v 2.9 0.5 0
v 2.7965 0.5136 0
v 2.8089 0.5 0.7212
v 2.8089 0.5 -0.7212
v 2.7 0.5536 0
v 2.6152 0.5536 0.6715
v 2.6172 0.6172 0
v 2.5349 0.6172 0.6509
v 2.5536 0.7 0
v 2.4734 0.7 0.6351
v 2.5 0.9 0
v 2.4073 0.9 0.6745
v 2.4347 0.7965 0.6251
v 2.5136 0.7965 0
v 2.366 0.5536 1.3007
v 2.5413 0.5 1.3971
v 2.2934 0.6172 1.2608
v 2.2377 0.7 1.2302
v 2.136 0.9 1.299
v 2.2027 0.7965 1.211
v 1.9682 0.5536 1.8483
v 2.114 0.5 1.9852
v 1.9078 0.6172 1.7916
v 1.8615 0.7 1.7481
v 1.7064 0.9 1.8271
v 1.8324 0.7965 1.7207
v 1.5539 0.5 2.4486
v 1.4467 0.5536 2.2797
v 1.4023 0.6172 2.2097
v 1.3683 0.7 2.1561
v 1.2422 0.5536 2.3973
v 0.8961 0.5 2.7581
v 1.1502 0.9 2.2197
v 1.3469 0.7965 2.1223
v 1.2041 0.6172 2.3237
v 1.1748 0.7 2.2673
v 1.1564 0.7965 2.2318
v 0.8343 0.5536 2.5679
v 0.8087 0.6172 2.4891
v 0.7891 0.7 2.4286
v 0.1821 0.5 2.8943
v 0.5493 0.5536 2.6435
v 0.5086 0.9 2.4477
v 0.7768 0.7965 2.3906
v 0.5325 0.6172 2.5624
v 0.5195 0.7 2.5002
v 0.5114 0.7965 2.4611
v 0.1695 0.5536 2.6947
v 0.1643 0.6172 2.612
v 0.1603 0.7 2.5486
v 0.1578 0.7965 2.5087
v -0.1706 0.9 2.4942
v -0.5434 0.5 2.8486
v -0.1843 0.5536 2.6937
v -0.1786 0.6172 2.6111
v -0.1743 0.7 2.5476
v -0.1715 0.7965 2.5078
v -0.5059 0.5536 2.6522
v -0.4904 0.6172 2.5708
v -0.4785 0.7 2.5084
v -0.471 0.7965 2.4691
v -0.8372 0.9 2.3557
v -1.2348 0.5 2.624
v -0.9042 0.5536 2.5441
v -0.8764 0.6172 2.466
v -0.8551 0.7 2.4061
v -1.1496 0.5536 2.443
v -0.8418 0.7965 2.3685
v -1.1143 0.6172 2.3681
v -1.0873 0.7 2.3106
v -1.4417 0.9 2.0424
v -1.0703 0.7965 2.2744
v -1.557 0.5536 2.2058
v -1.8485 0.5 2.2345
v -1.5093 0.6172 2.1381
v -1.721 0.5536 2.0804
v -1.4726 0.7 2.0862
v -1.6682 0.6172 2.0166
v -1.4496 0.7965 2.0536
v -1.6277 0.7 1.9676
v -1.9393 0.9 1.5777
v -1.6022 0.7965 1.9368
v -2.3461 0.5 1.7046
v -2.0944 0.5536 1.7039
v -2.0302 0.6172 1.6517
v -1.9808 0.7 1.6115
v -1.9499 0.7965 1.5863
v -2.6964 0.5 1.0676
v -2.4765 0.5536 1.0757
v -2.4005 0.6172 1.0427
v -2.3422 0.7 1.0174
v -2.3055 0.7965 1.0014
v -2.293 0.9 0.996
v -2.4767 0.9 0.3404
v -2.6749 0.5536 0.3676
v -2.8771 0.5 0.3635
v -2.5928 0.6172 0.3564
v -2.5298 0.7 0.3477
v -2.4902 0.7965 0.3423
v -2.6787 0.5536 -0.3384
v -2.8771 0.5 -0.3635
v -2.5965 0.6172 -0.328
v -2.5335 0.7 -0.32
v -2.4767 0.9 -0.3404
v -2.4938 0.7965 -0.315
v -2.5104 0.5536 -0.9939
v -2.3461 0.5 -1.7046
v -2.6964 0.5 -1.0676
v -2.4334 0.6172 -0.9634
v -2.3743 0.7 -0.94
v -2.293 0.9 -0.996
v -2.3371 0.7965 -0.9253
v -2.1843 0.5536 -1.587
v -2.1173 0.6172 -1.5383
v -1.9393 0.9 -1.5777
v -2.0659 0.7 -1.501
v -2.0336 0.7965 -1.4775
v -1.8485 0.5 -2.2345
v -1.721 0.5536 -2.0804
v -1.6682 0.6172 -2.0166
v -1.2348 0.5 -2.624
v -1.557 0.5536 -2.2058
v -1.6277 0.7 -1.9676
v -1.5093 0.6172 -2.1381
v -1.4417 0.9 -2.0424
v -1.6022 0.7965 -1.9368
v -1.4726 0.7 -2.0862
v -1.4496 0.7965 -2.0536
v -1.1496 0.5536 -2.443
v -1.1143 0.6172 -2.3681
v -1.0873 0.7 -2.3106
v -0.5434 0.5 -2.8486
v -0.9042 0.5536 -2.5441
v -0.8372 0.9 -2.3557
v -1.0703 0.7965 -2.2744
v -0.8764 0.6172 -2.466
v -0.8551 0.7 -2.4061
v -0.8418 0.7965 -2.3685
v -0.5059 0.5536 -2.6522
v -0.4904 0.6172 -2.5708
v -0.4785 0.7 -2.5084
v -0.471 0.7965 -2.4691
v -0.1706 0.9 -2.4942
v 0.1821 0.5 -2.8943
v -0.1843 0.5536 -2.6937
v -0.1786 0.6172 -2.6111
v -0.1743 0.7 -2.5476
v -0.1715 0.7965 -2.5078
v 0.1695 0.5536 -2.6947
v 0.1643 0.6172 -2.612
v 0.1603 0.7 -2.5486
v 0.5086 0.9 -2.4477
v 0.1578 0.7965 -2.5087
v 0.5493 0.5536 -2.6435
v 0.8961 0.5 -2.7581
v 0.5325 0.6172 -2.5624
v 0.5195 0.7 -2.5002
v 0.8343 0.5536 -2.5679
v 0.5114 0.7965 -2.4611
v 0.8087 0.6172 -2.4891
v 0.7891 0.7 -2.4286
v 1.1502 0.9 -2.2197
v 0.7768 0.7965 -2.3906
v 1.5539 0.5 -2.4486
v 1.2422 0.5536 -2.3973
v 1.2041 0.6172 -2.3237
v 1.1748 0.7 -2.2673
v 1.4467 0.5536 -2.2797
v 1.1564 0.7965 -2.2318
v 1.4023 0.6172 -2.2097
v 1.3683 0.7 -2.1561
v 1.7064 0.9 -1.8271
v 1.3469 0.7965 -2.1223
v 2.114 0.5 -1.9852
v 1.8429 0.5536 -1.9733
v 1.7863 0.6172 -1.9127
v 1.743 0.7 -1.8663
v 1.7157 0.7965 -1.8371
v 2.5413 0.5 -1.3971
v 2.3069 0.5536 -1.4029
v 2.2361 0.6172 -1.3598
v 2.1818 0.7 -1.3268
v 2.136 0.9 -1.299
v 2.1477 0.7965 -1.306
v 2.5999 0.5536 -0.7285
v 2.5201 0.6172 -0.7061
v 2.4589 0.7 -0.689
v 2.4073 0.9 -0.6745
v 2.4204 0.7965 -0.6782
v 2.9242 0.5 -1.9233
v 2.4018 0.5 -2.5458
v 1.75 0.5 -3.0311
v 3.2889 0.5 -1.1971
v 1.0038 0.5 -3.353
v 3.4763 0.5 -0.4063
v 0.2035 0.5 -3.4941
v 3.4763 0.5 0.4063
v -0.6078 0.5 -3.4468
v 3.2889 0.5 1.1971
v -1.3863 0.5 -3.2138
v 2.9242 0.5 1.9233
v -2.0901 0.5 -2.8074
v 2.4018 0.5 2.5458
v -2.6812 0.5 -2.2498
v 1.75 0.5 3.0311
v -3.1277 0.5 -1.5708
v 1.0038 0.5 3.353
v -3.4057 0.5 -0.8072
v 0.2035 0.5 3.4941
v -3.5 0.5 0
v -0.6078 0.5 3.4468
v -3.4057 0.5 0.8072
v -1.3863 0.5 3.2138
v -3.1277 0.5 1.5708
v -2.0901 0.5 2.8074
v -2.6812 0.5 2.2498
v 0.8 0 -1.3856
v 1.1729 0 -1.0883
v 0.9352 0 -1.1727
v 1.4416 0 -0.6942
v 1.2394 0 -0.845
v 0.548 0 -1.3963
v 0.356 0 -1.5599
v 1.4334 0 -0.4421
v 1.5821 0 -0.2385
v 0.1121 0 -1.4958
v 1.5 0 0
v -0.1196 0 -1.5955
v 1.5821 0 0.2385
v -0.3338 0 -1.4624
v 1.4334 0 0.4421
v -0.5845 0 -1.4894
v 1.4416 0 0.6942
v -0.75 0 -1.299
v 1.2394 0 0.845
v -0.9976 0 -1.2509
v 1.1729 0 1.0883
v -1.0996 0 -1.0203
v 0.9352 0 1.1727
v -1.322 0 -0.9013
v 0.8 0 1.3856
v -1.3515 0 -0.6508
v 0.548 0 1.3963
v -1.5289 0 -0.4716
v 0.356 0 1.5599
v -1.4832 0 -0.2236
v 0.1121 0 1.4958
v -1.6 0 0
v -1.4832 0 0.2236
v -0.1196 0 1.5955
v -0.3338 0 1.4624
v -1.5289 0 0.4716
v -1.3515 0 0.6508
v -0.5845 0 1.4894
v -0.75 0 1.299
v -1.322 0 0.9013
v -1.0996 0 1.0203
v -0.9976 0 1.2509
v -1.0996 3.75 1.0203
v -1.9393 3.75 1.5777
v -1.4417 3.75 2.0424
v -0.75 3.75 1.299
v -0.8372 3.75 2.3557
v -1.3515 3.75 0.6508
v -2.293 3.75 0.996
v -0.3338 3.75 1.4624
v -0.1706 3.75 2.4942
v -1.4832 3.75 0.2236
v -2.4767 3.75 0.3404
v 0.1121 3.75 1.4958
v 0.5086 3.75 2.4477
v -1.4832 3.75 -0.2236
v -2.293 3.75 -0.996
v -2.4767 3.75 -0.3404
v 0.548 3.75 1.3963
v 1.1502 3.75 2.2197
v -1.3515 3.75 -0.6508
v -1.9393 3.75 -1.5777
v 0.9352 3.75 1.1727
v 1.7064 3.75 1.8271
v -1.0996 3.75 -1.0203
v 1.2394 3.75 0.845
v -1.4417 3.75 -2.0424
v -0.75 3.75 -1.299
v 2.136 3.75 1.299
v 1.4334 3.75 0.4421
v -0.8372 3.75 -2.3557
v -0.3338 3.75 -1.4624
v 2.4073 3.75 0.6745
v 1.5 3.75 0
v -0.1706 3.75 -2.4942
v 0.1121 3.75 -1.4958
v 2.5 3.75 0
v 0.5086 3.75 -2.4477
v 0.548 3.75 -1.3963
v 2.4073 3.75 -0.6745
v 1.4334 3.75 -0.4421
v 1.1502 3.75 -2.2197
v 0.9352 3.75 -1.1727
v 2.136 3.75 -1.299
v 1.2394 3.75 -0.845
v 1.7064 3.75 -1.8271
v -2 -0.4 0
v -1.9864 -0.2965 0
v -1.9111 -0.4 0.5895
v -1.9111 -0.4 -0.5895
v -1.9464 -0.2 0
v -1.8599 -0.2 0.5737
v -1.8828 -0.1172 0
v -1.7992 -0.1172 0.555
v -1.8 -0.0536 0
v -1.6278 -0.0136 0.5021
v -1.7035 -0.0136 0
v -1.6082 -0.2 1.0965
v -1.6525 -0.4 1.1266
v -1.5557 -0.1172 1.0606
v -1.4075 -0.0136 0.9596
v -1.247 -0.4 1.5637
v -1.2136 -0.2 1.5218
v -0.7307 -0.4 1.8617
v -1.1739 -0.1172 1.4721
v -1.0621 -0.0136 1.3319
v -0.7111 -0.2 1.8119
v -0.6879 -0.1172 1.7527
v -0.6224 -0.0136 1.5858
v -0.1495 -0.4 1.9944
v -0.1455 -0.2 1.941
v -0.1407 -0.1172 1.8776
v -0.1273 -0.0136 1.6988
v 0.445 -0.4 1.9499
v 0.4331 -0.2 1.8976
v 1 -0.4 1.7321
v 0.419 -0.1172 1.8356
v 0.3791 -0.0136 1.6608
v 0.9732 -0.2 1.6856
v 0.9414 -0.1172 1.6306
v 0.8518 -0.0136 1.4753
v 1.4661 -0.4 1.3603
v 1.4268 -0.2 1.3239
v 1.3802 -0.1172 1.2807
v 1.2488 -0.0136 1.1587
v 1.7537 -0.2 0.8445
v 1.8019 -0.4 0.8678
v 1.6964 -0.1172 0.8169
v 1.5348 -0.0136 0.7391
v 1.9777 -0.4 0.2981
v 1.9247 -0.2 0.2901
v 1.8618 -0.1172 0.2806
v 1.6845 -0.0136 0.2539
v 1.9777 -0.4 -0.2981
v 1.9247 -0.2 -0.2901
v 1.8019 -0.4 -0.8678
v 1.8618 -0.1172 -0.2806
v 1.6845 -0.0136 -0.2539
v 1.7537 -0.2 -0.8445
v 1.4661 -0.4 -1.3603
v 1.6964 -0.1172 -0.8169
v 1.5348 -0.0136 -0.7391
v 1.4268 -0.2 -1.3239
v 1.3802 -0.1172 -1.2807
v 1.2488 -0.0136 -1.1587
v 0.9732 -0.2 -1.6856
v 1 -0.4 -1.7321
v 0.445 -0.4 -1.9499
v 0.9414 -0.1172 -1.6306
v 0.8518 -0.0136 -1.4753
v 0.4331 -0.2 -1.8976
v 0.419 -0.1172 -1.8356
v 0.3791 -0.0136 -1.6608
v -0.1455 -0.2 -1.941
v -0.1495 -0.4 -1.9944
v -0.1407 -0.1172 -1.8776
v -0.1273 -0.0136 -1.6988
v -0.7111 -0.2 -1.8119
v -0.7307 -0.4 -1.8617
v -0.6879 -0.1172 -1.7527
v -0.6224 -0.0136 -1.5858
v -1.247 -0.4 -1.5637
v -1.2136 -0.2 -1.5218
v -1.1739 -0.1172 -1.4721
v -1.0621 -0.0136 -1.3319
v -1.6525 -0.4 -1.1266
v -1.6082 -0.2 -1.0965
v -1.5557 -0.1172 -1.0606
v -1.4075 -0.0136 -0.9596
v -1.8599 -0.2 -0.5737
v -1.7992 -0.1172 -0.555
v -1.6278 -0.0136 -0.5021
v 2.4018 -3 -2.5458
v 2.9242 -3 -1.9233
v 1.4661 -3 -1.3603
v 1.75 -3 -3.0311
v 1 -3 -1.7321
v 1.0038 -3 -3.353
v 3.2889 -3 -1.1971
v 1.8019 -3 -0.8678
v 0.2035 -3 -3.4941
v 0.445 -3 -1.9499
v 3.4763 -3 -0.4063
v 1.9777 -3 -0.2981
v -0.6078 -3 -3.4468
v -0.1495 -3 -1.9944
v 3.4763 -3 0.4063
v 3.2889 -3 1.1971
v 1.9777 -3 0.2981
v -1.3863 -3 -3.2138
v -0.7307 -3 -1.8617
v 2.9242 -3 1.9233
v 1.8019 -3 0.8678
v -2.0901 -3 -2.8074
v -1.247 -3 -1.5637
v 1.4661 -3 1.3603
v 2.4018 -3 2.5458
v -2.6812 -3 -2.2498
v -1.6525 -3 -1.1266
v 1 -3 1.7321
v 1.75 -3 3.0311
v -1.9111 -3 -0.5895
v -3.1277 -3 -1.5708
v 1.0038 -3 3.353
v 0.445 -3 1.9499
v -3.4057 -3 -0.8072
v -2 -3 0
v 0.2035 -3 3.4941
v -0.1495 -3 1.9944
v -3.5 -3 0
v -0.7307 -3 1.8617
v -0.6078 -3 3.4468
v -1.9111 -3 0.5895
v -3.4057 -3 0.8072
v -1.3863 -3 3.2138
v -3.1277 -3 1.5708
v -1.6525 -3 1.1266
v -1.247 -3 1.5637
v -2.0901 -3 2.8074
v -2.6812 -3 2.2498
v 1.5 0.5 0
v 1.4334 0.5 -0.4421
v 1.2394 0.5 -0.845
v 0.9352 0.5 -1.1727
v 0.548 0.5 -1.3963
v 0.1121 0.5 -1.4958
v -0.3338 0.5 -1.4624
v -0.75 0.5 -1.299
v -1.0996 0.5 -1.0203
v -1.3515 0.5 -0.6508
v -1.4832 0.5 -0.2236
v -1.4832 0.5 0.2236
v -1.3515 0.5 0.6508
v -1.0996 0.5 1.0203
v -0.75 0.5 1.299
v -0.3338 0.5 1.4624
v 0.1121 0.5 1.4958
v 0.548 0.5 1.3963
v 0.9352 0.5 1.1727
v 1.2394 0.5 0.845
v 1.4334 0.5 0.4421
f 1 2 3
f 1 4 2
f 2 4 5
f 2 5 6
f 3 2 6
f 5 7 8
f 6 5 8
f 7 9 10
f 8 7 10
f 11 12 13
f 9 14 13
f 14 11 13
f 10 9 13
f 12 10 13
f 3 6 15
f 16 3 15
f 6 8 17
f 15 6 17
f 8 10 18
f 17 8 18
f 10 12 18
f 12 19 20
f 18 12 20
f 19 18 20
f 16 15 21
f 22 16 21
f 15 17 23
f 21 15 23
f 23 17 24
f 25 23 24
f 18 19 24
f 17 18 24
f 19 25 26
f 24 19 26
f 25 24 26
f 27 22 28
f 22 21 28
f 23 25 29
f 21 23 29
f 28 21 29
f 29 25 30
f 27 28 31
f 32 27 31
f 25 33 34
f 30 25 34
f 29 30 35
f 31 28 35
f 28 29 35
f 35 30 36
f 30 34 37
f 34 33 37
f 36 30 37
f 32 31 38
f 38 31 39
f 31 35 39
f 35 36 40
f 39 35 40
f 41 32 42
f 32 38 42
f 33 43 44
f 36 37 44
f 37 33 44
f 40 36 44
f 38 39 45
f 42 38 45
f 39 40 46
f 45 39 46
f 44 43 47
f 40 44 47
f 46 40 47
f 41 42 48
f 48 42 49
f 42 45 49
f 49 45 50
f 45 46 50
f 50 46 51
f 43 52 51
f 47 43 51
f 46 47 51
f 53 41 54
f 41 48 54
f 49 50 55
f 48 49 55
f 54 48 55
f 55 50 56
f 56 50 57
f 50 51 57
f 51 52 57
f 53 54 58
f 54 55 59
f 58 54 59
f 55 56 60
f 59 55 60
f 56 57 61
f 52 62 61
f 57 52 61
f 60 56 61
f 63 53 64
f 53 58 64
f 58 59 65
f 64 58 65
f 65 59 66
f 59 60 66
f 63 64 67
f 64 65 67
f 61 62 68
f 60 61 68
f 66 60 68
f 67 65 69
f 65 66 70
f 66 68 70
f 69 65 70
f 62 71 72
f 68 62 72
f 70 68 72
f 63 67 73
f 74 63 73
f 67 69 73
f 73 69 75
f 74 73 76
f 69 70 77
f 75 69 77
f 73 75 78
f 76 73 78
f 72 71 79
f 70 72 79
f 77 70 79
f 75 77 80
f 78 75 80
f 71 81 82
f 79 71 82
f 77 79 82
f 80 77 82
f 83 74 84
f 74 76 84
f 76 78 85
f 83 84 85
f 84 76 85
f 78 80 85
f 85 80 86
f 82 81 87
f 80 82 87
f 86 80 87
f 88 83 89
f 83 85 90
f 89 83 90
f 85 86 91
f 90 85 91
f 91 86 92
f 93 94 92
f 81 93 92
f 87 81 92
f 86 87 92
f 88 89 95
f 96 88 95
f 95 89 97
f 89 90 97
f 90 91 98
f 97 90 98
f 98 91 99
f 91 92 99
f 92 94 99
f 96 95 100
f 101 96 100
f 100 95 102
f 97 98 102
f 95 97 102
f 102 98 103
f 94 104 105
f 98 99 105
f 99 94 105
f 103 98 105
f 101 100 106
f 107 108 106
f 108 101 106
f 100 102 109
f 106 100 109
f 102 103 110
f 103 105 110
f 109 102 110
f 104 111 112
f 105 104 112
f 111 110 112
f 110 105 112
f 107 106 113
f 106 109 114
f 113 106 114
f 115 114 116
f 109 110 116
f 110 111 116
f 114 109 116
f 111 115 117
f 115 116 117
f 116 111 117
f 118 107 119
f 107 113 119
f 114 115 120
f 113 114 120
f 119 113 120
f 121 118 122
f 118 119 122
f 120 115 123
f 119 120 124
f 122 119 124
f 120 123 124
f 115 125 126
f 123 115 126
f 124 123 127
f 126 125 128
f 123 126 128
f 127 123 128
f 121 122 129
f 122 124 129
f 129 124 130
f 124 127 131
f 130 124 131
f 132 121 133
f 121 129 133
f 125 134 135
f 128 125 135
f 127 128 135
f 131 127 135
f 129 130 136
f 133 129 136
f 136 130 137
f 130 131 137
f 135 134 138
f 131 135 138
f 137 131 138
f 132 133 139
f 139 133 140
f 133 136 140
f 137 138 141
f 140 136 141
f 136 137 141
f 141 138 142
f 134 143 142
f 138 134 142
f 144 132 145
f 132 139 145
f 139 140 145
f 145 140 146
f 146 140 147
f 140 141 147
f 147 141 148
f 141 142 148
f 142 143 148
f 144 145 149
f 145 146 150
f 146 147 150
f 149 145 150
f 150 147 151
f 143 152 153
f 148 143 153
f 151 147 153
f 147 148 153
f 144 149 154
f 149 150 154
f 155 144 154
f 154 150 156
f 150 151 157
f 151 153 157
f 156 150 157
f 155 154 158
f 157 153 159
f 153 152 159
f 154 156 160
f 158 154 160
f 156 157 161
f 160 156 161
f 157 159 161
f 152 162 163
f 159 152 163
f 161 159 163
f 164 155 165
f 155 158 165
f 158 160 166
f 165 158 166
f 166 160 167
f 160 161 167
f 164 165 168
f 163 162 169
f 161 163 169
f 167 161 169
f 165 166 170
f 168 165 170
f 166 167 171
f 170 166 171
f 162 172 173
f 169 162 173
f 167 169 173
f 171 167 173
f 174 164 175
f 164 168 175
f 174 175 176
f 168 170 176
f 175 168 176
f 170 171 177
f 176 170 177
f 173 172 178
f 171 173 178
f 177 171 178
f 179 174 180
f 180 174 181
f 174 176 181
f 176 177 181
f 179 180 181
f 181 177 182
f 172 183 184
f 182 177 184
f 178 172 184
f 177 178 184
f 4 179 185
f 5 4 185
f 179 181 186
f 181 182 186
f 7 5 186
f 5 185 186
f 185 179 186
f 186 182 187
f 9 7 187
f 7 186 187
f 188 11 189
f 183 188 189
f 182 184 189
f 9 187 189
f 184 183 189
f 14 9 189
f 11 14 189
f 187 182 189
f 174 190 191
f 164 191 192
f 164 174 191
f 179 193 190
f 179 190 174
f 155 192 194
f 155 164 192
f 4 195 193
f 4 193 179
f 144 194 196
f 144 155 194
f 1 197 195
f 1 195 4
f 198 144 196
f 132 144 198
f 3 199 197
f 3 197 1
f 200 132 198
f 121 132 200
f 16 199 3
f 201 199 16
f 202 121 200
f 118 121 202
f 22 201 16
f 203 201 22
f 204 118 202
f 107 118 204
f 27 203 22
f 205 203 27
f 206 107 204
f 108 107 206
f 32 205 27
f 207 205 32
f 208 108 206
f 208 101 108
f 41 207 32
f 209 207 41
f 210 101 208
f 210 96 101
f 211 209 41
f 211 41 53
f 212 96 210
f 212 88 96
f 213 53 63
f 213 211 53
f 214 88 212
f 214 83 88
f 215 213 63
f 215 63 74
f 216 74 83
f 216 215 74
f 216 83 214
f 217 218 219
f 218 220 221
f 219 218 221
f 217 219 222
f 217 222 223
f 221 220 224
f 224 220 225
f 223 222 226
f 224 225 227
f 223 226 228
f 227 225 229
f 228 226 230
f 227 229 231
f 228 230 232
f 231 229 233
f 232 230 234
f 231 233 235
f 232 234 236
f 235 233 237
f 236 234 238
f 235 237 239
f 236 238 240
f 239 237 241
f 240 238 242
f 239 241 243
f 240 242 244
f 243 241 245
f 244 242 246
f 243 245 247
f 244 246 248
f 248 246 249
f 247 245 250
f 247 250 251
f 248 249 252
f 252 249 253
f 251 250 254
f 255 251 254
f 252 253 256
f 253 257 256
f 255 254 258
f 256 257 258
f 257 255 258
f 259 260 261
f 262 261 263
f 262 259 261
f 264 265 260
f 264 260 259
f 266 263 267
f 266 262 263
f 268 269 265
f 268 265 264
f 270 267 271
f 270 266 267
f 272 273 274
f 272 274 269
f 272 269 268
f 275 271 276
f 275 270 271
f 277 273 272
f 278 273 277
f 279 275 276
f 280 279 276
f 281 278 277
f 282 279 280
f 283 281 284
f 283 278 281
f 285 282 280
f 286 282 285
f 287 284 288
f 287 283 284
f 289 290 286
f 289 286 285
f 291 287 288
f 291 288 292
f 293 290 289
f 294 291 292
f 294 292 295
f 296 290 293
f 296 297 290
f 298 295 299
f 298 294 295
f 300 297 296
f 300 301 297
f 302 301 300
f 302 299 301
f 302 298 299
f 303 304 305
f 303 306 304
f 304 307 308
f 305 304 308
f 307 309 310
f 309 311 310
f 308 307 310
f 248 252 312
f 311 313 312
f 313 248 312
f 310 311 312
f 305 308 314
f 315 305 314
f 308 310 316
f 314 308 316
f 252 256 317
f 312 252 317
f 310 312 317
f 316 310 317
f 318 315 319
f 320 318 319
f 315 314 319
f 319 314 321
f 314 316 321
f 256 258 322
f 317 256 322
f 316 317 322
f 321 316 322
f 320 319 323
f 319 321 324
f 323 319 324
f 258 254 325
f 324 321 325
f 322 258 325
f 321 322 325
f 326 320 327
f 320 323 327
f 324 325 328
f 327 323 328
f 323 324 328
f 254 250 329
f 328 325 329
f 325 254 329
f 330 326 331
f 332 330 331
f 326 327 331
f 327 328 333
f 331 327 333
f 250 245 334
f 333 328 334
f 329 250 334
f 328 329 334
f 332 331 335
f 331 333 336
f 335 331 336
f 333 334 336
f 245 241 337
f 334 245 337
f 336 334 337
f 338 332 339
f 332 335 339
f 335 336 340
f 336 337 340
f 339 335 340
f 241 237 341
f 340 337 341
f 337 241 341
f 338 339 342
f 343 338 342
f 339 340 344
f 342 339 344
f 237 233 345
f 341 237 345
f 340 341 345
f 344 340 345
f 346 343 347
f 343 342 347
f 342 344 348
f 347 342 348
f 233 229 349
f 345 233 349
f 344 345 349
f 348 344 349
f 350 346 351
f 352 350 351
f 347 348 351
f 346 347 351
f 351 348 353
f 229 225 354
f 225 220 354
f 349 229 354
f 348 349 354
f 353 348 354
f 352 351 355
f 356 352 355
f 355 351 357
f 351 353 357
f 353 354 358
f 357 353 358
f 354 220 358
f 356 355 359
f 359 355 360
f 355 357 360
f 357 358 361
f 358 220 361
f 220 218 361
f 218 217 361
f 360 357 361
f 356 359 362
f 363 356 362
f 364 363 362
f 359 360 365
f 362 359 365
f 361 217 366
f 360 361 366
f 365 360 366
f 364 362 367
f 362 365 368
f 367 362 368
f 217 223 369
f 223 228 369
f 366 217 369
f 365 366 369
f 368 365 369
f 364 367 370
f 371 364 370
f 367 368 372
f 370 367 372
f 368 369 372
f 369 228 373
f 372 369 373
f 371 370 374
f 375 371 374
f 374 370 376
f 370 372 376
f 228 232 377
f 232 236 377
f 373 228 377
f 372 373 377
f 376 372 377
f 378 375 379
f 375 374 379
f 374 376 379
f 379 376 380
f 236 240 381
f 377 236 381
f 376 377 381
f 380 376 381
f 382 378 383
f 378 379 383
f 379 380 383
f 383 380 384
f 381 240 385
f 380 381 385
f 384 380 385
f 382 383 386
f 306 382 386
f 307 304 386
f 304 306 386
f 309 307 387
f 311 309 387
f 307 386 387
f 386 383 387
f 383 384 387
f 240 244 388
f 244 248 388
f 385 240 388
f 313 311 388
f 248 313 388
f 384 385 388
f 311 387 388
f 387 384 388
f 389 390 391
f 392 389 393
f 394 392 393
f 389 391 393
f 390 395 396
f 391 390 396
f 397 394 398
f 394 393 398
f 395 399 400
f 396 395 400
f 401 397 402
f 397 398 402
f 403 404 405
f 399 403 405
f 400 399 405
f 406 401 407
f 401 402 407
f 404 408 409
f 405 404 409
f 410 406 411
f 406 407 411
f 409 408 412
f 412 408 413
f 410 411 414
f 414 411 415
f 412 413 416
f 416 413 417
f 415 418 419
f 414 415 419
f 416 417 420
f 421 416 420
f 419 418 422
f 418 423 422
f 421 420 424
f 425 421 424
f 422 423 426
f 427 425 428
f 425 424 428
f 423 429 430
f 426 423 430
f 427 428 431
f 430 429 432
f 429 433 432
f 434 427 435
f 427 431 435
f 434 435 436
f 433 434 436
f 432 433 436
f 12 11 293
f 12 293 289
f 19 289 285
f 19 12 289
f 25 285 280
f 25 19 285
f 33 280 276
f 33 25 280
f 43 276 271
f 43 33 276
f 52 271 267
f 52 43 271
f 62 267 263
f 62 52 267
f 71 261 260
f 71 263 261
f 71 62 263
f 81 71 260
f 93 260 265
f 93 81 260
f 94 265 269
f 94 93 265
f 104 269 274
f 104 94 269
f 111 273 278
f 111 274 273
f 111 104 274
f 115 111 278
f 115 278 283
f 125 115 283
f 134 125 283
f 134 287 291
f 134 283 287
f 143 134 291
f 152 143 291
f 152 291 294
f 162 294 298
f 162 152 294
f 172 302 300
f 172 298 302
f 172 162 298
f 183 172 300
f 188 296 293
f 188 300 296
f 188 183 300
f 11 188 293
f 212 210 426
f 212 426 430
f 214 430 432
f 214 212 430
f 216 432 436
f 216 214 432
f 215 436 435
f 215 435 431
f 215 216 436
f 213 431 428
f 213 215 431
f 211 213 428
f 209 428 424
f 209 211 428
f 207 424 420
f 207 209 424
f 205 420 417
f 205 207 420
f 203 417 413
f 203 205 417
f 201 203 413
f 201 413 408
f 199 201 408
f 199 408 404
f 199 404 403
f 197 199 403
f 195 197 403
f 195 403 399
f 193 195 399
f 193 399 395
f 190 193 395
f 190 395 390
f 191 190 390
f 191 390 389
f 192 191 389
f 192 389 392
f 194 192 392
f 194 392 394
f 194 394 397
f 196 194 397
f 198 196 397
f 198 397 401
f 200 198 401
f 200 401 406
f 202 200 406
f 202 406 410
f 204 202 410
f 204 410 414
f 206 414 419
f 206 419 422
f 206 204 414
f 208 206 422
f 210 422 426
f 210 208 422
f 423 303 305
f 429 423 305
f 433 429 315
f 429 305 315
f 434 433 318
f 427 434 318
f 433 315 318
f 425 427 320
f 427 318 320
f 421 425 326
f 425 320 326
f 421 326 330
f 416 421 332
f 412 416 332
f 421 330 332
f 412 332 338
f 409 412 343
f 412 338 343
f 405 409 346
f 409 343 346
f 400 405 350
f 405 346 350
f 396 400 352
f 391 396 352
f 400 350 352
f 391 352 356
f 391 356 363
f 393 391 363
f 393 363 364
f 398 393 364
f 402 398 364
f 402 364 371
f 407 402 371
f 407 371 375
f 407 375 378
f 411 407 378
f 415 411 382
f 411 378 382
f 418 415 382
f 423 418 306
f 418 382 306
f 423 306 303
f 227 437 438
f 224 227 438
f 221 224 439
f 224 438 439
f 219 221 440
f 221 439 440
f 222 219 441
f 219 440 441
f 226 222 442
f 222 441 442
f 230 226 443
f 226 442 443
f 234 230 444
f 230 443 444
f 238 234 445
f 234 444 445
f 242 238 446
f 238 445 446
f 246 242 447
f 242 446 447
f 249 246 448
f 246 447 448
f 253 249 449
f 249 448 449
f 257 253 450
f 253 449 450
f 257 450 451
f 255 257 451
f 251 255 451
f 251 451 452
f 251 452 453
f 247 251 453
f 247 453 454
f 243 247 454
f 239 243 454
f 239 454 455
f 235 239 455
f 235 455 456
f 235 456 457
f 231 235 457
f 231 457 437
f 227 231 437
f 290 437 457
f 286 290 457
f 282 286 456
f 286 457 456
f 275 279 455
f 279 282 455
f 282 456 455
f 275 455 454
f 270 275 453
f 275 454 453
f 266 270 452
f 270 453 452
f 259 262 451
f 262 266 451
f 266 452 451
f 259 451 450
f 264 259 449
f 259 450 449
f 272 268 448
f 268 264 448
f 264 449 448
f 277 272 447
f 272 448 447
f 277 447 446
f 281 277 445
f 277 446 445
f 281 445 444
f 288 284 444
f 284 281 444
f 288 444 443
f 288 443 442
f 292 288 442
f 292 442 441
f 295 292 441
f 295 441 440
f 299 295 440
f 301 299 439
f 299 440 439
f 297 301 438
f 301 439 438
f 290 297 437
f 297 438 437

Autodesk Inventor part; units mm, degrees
ref_plane "YZ Plane" through (0, 0, 0) normal (1, 0, 0) x (0, 1, 0)
ref_plane "XZ Plane" through (0, 0, 0) normal (0, 1, 0) x (-1, 0, 0)
ref_plane "XY Plane" through (0, 0, 0) normal (0, 0, 1) x (1, 0, 0)
sketch "Sketch1" plane through (0, 0, 0) normal (0, 1, 0) x (-1, 0, 0)
  circle A0 centre (0, 0) radius 3.5
  circle A1 centre (0, 0) radius 2
  dimension "d0" = 7
  dimension "d2" = 4
extrude "Extrusion1" add sketch "Sketch1" against normal blind 3
extrude "Extrusion2" add sketch "Sketch1" along normal blind 0.5 contours A0 | A1
sketch "Sketch2" plane through (0, 0.5, 0) normal (0, 1, 0) x (1, 0, 0)
  circle A0 centre (0, 0) radius 2.5
  circle A1 centre (0, 0) radius 1.5
  dimension "d10" = 5
  dimension "d11" = 3
extrude "Extrusion4" add sketch "Sketch2" along normal blind 3.25
fillet "Fillet1" radius 0.4 2 edges at (-2.5, 0.5, 0) (2, 0, 0)
extrude "Extrusion5" cut sketch "Sketch2" against normal blind 3.25 contours A1
properties part number "m.2 support"
